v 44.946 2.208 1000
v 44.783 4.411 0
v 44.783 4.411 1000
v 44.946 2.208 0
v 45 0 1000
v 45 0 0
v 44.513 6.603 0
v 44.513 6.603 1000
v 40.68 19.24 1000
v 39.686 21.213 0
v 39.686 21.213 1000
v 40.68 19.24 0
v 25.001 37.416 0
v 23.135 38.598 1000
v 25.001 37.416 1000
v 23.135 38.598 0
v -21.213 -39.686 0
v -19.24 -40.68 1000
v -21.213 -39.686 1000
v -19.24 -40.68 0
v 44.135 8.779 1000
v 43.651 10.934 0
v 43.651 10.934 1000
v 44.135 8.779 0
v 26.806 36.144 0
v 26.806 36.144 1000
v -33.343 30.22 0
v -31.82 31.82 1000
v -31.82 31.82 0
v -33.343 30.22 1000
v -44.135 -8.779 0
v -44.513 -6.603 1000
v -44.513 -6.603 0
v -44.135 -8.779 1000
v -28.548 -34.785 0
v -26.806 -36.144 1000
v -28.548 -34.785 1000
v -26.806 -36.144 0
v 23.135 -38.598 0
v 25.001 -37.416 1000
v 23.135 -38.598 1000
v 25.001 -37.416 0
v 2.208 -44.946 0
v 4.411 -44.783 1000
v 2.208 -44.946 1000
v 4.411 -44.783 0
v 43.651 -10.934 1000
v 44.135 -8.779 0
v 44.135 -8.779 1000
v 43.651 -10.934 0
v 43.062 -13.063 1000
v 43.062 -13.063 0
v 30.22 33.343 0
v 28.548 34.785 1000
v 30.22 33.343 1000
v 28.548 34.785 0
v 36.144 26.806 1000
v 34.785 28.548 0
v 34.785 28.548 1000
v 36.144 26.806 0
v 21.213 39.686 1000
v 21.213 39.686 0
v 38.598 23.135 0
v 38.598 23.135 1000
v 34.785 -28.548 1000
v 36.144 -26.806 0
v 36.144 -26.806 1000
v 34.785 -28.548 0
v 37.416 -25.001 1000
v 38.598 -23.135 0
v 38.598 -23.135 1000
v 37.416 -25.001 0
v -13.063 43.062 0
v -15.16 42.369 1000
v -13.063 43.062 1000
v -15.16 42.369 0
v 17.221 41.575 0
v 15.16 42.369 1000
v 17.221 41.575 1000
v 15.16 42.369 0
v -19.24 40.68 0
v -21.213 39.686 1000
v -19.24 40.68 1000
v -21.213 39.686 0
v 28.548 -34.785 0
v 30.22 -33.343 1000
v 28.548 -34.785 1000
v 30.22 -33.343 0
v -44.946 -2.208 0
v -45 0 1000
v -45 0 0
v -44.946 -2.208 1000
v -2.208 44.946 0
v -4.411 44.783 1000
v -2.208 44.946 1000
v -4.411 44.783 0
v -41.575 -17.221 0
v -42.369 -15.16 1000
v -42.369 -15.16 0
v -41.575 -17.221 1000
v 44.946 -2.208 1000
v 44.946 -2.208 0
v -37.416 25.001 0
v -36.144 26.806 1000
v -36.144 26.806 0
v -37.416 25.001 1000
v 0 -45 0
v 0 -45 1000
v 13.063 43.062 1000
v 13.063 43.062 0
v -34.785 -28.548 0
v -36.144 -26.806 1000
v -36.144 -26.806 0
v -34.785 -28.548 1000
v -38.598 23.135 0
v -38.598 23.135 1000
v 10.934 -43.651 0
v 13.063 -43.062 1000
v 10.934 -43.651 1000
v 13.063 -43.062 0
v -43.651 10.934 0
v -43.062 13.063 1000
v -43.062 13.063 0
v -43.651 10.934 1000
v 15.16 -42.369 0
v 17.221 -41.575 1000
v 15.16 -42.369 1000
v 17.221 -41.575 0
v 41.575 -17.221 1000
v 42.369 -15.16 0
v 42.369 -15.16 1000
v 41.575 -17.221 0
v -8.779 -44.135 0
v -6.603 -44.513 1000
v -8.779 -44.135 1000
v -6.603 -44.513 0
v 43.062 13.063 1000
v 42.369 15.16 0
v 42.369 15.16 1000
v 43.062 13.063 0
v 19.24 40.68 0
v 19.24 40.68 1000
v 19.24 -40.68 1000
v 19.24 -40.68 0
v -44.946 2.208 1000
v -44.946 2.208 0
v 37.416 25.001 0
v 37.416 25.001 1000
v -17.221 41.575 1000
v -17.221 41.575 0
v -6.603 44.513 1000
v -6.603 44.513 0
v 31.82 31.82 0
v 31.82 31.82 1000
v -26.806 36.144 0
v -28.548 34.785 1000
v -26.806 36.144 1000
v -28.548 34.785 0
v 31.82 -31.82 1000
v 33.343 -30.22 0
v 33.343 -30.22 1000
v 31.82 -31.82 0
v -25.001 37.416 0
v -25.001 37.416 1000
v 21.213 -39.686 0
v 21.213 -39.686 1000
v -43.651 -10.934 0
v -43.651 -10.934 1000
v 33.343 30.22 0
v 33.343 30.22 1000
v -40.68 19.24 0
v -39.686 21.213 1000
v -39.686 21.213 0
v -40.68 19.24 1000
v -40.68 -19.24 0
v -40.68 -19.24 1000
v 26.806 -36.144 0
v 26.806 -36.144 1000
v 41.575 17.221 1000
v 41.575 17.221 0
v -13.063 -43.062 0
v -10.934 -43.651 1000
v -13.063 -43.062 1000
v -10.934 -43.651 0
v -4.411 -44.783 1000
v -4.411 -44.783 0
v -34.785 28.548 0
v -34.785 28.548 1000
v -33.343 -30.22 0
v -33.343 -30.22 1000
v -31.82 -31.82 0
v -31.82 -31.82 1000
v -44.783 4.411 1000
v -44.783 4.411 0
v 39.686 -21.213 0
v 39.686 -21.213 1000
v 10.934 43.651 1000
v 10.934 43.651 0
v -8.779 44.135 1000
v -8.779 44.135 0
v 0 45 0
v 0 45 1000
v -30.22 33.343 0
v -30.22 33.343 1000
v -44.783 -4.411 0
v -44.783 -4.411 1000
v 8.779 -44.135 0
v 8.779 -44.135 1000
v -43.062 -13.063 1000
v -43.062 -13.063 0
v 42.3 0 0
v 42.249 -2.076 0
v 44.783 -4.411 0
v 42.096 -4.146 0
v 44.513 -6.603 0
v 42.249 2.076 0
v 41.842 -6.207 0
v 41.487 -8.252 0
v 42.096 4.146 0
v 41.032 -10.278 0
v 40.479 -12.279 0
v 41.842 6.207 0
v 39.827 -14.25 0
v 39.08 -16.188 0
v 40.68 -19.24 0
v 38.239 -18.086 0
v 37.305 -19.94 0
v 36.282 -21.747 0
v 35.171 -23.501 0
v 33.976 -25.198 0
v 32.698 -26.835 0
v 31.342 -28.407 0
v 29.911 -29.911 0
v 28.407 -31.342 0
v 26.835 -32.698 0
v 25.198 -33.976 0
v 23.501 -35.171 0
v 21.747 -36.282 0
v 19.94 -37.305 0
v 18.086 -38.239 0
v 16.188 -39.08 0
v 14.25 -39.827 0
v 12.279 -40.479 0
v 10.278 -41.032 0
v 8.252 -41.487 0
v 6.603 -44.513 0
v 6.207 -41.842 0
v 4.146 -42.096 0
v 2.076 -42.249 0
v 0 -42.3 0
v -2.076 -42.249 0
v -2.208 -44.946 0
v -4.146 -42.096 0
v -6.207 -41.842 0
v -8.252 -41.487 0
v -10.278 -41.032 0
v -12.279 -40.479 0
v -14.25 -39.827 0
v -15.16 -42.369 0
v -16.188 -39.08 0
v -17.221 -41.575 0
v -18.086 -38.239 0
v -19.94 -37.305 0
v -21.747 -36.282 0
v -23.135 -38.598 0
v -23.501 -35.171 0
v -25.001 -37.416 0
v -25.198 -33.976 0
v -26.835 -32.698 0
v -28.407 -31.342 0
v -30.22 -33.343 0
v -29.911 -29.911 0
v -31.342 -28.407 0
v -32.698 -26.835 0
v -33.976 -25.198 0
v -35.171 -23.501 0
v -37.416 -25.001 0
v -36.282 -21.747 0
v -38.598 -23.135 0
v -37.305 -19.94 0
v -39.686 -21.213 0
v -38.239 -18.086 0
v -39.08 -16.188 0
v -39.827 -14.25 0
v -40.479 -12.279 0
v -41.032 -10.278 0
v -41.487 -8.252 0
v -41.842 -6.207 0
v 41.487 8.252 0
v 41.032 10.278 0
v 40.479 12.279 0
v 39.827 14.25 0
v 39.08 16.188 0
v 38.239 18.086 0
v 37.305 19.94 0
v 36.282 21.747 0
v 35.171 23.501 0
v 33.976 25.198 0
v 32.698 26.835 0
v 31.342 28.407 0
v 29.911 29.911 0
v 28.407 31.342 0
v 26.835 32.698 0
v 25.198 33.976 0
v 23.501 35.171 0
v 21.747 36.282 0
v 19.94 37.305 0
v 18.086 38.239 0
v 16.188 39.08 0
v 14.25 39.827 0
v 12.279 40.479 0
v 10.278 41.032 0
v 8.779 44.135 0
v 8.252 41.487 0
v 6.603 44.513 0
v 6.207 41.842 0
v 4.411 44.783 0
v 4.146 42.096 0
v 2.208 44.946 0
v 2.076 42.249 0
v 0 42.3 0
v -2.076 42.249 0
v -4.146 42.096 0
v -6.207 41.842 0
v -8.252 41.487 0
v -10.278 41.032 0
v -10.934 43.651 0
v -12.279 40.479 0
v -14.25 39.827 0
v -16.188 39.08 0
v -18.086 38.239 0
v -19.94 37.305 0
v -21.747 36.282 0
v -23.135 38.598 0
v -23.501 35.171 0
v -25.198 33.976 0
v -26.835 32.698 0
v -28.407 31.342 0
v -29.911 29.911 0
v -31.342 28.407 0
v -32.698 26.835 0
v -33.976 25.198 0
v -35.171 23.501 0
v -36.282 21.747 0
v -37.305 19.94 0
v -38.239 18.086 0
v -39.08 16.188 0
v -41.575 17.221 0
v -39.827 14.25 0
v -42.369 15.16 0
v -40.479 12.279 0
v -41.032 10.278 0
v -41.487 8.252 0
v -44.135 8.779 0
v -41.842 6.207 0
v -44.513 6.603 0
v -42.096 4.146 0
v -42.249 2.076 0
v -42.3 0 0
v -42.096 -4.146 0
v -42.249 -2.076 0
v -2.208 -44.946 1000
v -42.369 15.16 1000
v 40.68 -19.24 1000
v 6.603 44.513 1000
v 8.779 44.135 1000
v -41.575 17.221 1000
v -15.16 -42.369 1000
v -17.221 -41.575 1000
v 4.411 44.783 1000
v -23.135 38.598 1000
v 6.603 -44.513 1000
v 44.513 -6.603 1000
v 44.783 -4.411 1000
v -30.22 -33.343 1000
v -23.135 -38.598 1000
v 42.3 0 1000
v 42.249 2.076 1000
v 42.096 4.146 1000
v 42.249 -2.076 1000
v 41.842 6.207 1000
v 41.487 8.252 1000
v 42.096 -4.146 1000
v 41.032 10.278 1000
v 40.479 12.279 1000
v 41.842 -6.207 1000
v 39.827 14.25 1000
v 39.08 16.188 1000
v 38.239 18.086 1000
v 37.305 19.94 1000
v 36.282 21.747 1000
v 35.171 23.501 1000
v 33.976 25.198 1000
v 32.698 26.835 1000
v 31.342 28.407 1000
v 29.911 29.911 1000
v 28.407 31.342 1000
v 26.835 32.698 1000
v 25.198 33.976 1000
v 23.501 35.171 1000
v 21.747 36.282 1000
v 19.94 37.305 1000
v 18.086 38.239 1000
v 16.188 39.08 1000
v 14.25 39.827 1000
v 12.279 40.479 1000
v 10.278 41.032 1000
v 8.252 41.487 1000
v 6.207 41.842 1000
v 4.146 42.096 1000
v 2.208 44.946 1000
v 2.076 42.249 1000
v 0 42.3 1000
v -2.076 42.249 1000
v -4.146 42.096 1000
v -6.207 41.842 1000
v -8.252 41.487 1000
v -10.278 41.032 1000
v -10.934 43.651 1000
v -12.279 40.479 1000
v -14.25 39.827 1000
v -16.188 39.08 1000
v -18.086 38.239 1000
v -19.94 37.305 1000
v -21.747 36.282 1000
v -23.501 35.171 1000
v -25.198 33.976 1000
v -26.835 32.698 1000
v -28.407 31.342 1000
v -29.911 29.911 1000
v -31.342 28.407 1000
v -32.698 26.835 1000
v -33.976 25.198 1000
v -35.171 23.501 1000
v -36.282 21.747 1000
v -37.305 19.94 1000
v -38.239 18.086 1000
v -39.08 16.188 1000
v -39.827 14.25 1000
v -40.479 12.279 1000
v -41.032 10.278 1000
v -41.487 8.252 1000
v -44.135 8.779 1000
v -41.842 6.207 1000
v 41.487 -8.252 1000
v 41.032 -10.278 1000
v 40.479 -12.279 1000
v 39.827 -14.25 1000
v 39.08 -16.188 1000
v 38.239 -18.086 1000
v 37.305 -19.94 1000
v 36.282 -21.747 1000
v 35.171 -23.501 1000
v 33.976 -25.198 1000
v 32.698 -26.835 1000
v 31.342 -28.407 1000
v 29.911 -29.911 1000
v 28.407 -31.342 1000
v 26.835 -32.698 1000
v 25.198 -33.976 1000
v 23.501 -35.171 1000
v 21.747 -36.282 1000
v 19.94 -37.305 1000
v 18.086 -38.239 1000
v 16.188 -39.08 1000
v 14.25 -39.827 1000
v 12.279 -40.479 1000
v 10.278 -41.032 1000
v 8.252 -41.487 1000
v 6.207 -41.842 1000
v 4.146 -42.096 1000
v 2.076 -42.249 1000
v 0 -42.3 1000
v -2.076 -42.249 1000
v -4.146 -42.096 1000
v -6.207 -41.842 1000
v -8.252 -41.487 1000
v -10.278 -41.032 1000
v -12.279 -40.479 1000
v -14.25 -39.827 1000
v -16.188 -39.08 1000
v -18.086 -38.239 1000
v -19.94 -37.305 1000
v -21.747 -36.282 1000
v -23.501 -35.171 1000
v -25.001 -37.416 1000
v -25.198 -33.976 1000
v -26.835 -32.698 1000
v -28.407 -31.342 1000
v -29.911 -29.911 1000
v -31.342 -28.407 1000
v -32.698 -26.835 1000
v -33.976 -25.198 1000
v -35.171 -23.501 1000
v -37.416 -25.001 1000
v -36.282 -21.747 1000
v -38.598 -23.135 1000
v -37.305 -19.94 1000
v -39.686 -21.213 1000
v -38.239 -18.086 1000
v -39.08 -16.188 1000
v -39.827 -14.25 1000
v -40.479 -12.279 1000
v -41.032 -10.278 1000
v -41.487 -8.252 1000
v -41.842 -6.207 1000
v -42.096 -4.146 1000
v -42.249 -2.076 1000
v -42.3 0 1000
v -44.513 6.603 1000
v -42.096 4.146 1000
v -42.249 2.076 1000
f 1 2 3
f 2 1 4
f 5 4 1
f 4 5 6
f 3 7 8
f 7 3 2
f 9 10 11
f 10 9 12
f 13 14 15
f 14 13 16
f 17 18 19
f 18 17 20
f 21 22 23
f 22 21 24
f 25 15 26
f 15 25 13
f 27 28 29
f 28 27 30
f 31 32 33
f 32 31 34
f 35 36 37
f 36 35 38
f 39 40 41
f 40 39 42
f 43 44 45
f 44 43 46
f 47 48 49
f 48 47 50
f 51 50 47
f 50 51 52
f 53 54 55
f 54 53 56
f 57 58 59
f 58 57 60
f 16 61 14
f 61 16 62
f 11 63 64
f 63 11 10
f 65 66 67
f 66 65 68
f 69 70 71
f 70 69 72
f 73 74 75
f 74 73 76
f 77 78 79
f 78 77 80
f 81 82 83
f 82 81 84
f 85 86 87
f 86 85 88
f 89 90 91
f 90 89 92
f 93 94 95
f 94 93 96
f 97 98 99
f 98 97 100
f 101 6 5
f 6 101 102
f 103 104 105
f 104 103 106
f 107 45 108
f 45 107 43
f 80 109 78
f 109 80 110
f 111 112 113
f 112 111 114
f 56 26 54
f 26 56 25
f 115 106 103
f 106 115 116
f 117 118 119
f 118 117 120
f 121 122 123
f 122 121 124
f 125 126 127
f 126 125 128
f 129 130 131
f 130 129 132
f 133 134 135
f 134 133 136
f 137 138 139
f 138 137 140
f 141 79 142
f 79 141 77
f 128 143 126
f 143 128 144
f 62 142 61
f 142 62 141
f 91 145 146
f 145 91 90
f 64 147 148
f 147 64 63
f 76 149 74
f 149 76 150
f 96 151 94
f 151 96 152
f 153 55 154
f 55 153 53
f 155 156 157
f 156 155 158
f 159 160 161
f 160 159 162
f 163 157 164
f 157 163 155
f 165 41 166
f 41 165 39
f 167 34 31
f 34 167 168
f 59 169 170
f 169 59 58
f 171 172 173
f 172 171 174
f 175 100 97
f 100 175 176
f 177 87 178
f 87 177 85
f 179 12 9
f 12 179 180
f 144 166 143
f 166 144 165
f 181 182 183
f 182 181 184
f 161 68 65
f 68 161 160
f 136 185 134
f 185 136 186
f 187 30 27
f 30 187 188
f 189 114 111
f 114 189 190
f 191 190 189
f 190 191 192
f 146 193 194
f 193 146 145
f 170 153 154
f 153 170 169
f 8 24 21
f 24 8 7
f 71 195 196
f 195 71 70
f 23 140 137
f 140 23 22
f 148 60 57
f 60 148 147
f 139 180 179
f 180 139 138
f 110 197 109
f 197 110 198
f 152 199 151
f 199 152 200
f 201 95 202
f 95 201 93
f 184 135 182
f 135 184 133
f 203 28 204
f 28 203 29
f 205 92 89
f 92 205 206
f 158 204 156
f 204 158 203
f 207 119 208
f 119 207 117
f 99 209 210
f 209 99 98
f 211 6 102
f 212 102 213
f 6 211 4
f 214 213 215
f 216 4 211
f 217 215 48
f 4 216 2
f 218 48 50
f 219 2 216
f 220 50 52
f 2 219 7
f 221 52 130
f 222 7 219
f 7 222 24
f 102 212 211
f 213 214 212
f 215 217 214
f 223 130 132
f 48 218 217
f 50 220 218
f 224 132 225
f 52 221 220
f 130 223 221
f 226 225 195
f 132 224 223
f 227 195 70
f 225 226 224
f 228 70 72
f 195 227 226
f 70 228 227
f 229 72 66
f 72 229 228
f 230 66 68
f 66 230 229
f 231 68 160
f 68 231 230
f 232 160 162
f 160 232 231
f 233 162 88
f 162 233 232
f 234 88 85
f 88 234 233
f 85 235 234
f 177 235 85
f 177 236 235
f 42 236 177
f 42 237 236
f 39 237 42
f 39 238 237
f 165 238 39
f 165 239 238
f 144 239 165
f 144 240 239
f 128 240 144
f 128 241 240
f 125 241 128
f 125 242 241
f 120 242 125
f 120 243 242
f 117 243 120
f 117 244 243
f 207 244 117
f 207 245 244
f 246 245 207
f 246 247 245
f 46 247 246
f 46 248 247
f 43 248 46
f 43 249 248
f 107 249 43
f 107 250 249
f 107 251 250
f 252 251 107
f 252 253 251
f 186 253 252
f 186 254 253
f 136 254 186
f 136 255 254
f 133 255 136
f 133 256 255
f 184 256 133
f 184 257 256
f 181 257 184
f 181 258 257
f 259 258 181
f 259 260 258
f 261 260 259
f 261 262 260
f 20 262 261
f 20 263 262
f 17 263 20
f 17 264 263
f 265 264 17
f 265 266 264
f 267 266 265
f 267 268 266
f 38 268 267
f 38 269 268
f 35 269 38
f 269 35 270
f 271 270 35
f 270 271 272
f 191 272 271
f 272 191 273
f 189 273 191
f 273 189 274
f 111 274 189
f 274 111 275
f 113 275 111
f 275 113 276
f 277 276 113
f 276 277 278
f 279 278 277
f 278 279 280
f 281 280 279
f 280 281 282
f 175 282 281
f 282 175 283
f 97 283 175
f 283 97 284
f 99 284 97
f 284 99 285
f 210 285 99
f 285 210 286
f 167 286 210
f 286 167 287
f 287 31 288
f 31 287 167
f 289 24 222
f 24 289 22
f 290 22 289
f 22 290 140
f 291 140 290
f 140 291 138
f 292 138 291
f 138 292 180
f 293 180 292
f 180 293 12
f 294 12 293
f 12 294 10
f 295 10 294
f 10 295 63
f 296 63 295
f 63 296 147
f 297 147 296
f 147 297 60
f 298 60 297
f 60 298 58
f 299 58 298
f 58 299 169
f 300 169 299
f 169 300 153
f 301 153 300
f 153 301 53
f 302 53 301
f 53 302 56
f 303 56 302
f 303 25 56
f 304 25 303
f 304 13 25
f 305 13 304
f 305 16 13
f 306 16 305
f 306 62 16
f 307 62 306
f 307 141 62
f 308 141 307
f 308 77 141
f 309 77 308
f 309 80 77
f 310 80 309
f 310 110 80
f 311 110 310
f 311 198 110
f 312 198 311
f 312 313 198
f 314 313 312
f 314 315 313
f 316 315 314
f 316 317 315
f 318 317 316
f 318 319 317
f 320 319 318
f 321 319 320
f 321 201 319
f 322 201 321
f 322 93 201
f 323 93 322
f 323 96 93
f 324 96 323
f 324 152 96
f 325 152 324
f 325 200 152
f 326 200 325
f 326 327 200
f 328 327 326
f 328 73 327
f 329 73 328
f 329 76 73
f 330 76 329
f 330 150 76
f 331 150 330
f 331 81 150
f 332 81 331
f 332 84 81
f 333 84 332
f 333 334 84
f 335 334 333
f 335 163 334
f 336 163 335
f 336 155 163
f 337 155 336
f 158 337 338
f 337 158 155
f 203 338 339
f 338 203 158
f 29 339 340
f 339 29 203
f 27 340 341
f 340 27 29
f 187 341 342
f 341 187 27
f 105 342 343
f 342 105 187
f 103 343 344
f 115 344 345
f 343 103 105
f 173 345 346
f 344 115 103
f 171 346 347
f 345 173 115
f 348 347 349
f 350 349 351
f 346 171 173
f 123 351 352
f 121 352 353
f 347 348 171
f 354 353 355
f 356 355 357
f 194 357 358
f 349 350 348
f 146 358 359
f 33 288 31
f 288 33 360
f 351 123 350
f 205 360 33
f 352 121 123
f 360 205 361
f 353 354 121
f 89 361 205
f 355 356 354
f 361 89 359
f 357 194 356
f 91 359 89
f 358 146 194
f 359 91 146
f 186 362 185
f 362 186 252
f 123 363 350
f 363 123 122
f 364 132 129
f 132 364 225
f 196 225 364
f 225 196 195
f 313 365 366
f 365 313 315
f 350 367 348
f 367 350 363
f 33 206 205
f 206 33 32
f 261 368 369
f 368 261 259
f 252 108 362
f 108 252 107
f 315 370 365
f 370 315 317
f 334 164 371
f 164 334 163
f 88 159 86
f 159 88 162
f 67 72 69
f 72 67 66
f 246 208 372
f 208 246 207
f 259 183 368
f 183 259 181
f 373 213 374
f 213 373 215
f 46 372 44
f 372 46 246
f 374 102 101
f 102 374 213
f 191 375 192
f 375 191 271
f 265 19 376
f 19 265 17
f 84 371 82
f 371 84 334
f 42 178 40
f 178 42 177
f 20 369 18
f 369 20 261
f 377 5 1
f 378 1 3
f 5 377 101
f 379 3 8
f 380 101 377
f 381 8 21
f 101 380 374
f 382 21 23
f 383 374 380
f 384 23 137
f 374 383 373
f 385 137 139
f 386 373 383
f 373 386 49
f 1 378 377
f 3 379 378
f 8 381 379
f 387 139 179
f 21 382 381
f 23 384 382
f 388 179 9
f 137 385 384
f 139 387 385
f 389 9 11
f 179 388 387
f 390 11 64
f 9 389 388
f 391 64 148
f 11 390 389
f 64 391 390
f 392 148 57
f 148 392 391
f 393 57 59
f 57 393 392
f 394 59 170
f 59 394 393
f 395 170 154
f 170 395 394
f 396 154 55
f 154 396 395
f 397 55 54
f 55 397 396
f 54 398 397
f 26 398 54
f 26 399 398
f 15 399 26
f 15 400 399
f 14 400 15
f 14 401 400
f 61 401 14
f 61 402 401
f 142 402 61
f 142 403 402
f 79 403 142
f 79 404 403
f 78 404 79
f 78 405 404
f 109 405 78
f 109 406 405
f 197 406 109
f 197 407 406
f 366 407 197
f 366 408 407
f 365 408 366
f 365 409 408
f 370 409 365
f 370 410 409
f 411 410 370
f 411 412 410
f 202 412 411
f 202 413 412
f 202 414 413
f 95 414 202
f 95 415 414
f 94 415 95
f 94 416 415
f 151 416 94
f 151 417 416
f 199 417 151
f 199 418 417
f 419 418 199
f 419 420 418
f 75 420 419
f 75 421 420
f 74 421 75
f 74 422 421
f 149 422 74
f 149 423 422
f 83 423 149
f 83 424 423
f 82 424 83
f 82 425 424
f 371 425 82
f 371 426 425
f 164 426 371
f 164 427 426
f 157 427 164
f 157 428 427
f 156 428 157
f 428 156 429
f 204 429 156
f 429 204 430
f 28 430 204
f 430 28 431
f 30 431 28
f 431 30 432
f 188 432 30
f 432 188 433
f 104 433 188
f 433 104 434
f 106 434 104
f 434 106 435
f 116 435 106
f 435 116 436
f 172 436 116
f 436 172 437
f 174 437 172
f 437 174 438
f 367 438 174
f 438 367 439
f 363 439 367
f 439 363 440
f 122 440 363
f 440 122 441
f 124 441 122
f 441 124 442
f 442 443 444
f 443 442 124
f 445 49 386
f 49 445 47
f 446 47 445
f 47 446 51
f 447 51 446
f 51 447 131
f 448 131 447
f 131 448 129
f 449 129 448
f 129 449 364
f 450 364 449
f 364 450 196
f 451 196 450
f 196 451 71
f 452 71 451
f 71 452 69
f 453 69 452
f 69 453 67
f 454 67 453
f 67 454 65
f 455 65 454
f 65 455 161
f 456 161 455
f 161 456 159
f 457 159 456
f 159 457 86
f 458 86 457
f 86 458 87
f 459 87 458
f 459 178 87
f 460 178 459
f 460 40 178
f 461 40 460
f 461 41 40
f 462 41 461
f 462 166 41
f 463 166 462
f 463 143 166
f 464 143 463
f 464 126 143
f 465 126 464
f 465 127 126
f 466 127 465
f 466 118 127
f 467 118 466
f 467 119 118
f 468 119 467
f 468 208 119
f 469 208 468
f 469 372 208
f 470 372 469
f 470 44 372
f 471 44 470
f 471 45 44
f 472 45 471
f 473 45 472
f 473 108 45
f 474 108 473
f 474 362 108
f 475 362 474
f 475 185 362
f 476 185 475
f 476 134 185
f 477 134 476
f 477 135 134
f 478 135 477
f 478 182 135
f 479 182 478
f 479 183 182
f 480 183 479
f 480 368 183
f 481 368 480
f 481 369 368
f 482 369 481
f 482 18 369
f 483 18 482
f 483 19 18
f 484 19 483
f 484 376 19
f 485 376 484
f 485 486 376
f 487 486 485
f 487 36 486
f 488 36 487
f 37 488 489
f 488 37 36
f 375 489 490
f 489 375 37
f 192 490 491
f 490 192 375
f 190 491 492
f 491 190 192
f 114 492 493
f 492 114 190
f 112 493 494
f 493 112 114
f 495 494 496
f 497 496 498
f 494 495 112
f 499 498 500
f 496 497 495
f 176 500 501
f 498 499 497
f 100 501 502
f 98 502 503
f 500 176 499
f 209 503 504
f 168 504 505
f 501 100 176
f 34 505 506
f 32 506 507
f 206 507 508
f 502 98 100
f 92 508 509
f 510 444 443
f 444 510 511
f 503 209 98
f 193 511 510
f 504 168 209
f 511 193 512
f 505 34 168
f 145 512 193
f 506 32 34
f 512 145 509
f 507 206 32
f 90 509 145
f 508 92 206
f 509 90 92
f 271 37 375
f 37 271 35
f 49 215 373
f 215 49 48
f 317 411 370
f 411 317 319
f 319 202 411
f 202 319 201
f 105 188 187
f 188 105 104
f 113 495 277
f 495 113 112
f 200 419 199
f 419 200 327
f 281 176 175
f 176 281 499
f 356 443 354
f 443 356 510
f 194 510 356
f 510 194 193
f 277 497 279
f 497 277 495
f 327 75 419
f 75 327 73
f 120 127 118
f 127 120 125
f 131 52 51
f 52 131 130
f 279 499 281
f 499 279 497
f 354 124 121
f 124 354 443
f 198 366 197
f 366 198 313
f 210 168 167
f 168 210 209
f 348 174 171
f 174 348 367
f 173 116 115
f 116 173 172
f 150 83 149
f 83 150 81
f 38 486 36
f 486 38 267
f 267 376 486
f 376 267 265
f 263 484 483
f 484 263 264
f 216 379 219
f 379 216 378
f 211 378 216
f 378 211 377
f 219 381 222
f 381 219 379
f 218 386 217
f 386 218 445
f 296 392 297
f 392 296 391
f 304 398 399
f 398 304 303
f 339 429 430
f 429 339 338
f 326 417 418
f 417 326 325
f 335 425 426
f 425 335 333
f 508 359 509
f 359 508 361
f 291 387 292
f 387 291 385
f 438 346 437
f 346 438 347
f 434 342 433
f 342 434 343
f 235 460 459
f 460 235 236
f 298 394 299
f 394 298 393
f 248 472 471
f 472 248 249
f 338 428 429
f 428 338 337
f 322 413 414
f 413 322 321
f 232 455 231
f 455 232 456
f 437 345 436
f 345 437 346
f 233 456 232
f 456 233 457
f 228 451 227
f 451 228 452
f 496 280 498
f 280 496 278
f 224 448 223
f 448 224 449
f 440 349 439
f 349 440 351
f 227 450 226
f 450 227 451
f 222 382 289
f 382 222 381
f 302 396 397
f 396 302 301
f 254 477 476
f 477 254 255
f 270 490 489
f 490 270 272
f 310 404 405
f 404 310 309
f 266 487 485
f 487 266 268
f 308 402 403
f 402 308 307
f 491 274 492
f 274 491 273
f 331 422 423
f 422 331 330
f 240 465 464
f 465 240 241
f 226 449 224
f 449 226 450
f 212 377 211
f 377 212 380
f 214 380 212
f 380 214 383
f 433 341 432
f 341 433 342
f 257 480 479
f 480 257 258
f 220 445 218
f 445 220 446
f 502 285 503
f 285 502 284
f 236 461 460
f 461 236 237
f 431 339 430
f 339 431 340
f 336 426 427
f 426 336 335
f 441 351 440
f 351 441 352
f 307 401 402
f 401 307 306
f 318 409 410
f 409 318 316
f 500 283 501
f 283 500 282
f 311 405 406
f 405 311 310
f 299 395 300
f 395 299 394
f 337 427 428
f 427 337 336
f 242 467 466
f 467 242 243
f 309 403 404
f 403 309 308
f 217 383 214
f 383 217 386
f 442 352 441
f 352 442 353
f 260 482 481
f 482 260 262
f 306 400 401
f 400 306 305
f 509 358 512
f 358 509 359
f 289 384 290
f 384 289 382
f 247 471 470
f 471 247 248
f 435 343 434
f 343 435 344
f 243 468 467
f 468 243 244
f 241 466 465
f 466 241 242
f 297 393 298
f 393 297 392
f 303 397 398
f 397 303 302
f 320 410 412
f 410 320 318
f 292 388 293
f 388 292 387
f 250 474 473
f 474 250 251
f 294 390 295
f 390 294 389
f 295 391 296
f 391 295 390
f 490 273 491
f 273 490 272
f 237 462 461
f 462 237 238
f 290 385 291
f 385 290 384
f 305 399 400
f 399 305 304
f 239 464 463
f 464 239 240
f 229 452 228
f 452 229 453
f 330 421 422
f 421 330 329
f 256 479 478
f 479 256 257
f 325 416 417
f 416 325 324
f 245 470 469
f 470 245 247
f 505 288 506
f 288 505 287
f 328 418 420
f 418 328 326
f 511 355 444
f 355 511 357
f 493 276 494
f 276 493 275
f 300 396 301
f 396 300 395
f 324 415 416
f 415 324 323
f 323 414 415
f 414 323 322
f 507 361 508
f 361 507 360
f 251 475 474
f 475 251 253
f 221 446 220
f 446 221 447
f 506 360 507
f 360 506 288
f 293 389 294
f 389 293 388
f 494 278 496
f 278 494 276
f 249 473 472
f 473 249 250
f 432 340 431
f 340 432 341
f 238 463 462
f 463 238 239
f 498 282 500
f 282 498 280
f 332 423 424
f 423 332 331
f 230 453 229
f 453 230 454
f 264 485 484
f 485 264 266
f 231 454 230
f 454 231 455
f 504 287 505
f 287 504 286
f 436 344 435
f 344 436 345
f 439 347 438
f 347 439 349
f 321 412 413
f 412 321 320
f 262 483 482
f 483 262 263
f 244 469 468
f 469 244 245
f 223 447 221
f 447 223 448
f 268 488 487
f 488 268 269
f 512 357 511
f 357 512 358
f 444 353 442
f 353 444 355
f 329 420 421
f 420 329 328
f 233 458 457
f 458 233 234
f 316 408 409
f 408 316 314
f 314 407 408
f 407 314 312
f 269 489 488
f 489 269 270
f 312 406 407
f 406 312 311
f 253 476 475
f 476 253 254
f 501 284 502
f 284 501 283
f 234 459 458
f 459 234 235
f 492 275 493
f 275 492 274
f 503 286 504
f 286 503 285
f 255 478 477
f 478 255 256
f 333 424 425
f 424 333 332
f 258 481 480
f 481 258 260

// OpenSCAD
$fn = 128;

// HT 90 pipe 1000 mm (interpreted as: DN90 sewer pipe, 1000 mm length)
// Typical DN90 HT pipe: OD ~ 90 mm, wall thickness ~ 2.7 mm
// Adjust parameters as needed.

length_mm = 1000;
outer_d_mm = 90;
wall_th_mm = 2.7;

module ht_pipe(len=1000, od=90, wall=2.7) {
    difference() {
        cylinder(h=len, d=od, center=false);
        translate([0,0,-0.5])
            cylinder(h=len+1, d=od-2*wall, center=false);
    }
}

ht_pipe(length_mm, outer_d_mm, wall_th_mm);
